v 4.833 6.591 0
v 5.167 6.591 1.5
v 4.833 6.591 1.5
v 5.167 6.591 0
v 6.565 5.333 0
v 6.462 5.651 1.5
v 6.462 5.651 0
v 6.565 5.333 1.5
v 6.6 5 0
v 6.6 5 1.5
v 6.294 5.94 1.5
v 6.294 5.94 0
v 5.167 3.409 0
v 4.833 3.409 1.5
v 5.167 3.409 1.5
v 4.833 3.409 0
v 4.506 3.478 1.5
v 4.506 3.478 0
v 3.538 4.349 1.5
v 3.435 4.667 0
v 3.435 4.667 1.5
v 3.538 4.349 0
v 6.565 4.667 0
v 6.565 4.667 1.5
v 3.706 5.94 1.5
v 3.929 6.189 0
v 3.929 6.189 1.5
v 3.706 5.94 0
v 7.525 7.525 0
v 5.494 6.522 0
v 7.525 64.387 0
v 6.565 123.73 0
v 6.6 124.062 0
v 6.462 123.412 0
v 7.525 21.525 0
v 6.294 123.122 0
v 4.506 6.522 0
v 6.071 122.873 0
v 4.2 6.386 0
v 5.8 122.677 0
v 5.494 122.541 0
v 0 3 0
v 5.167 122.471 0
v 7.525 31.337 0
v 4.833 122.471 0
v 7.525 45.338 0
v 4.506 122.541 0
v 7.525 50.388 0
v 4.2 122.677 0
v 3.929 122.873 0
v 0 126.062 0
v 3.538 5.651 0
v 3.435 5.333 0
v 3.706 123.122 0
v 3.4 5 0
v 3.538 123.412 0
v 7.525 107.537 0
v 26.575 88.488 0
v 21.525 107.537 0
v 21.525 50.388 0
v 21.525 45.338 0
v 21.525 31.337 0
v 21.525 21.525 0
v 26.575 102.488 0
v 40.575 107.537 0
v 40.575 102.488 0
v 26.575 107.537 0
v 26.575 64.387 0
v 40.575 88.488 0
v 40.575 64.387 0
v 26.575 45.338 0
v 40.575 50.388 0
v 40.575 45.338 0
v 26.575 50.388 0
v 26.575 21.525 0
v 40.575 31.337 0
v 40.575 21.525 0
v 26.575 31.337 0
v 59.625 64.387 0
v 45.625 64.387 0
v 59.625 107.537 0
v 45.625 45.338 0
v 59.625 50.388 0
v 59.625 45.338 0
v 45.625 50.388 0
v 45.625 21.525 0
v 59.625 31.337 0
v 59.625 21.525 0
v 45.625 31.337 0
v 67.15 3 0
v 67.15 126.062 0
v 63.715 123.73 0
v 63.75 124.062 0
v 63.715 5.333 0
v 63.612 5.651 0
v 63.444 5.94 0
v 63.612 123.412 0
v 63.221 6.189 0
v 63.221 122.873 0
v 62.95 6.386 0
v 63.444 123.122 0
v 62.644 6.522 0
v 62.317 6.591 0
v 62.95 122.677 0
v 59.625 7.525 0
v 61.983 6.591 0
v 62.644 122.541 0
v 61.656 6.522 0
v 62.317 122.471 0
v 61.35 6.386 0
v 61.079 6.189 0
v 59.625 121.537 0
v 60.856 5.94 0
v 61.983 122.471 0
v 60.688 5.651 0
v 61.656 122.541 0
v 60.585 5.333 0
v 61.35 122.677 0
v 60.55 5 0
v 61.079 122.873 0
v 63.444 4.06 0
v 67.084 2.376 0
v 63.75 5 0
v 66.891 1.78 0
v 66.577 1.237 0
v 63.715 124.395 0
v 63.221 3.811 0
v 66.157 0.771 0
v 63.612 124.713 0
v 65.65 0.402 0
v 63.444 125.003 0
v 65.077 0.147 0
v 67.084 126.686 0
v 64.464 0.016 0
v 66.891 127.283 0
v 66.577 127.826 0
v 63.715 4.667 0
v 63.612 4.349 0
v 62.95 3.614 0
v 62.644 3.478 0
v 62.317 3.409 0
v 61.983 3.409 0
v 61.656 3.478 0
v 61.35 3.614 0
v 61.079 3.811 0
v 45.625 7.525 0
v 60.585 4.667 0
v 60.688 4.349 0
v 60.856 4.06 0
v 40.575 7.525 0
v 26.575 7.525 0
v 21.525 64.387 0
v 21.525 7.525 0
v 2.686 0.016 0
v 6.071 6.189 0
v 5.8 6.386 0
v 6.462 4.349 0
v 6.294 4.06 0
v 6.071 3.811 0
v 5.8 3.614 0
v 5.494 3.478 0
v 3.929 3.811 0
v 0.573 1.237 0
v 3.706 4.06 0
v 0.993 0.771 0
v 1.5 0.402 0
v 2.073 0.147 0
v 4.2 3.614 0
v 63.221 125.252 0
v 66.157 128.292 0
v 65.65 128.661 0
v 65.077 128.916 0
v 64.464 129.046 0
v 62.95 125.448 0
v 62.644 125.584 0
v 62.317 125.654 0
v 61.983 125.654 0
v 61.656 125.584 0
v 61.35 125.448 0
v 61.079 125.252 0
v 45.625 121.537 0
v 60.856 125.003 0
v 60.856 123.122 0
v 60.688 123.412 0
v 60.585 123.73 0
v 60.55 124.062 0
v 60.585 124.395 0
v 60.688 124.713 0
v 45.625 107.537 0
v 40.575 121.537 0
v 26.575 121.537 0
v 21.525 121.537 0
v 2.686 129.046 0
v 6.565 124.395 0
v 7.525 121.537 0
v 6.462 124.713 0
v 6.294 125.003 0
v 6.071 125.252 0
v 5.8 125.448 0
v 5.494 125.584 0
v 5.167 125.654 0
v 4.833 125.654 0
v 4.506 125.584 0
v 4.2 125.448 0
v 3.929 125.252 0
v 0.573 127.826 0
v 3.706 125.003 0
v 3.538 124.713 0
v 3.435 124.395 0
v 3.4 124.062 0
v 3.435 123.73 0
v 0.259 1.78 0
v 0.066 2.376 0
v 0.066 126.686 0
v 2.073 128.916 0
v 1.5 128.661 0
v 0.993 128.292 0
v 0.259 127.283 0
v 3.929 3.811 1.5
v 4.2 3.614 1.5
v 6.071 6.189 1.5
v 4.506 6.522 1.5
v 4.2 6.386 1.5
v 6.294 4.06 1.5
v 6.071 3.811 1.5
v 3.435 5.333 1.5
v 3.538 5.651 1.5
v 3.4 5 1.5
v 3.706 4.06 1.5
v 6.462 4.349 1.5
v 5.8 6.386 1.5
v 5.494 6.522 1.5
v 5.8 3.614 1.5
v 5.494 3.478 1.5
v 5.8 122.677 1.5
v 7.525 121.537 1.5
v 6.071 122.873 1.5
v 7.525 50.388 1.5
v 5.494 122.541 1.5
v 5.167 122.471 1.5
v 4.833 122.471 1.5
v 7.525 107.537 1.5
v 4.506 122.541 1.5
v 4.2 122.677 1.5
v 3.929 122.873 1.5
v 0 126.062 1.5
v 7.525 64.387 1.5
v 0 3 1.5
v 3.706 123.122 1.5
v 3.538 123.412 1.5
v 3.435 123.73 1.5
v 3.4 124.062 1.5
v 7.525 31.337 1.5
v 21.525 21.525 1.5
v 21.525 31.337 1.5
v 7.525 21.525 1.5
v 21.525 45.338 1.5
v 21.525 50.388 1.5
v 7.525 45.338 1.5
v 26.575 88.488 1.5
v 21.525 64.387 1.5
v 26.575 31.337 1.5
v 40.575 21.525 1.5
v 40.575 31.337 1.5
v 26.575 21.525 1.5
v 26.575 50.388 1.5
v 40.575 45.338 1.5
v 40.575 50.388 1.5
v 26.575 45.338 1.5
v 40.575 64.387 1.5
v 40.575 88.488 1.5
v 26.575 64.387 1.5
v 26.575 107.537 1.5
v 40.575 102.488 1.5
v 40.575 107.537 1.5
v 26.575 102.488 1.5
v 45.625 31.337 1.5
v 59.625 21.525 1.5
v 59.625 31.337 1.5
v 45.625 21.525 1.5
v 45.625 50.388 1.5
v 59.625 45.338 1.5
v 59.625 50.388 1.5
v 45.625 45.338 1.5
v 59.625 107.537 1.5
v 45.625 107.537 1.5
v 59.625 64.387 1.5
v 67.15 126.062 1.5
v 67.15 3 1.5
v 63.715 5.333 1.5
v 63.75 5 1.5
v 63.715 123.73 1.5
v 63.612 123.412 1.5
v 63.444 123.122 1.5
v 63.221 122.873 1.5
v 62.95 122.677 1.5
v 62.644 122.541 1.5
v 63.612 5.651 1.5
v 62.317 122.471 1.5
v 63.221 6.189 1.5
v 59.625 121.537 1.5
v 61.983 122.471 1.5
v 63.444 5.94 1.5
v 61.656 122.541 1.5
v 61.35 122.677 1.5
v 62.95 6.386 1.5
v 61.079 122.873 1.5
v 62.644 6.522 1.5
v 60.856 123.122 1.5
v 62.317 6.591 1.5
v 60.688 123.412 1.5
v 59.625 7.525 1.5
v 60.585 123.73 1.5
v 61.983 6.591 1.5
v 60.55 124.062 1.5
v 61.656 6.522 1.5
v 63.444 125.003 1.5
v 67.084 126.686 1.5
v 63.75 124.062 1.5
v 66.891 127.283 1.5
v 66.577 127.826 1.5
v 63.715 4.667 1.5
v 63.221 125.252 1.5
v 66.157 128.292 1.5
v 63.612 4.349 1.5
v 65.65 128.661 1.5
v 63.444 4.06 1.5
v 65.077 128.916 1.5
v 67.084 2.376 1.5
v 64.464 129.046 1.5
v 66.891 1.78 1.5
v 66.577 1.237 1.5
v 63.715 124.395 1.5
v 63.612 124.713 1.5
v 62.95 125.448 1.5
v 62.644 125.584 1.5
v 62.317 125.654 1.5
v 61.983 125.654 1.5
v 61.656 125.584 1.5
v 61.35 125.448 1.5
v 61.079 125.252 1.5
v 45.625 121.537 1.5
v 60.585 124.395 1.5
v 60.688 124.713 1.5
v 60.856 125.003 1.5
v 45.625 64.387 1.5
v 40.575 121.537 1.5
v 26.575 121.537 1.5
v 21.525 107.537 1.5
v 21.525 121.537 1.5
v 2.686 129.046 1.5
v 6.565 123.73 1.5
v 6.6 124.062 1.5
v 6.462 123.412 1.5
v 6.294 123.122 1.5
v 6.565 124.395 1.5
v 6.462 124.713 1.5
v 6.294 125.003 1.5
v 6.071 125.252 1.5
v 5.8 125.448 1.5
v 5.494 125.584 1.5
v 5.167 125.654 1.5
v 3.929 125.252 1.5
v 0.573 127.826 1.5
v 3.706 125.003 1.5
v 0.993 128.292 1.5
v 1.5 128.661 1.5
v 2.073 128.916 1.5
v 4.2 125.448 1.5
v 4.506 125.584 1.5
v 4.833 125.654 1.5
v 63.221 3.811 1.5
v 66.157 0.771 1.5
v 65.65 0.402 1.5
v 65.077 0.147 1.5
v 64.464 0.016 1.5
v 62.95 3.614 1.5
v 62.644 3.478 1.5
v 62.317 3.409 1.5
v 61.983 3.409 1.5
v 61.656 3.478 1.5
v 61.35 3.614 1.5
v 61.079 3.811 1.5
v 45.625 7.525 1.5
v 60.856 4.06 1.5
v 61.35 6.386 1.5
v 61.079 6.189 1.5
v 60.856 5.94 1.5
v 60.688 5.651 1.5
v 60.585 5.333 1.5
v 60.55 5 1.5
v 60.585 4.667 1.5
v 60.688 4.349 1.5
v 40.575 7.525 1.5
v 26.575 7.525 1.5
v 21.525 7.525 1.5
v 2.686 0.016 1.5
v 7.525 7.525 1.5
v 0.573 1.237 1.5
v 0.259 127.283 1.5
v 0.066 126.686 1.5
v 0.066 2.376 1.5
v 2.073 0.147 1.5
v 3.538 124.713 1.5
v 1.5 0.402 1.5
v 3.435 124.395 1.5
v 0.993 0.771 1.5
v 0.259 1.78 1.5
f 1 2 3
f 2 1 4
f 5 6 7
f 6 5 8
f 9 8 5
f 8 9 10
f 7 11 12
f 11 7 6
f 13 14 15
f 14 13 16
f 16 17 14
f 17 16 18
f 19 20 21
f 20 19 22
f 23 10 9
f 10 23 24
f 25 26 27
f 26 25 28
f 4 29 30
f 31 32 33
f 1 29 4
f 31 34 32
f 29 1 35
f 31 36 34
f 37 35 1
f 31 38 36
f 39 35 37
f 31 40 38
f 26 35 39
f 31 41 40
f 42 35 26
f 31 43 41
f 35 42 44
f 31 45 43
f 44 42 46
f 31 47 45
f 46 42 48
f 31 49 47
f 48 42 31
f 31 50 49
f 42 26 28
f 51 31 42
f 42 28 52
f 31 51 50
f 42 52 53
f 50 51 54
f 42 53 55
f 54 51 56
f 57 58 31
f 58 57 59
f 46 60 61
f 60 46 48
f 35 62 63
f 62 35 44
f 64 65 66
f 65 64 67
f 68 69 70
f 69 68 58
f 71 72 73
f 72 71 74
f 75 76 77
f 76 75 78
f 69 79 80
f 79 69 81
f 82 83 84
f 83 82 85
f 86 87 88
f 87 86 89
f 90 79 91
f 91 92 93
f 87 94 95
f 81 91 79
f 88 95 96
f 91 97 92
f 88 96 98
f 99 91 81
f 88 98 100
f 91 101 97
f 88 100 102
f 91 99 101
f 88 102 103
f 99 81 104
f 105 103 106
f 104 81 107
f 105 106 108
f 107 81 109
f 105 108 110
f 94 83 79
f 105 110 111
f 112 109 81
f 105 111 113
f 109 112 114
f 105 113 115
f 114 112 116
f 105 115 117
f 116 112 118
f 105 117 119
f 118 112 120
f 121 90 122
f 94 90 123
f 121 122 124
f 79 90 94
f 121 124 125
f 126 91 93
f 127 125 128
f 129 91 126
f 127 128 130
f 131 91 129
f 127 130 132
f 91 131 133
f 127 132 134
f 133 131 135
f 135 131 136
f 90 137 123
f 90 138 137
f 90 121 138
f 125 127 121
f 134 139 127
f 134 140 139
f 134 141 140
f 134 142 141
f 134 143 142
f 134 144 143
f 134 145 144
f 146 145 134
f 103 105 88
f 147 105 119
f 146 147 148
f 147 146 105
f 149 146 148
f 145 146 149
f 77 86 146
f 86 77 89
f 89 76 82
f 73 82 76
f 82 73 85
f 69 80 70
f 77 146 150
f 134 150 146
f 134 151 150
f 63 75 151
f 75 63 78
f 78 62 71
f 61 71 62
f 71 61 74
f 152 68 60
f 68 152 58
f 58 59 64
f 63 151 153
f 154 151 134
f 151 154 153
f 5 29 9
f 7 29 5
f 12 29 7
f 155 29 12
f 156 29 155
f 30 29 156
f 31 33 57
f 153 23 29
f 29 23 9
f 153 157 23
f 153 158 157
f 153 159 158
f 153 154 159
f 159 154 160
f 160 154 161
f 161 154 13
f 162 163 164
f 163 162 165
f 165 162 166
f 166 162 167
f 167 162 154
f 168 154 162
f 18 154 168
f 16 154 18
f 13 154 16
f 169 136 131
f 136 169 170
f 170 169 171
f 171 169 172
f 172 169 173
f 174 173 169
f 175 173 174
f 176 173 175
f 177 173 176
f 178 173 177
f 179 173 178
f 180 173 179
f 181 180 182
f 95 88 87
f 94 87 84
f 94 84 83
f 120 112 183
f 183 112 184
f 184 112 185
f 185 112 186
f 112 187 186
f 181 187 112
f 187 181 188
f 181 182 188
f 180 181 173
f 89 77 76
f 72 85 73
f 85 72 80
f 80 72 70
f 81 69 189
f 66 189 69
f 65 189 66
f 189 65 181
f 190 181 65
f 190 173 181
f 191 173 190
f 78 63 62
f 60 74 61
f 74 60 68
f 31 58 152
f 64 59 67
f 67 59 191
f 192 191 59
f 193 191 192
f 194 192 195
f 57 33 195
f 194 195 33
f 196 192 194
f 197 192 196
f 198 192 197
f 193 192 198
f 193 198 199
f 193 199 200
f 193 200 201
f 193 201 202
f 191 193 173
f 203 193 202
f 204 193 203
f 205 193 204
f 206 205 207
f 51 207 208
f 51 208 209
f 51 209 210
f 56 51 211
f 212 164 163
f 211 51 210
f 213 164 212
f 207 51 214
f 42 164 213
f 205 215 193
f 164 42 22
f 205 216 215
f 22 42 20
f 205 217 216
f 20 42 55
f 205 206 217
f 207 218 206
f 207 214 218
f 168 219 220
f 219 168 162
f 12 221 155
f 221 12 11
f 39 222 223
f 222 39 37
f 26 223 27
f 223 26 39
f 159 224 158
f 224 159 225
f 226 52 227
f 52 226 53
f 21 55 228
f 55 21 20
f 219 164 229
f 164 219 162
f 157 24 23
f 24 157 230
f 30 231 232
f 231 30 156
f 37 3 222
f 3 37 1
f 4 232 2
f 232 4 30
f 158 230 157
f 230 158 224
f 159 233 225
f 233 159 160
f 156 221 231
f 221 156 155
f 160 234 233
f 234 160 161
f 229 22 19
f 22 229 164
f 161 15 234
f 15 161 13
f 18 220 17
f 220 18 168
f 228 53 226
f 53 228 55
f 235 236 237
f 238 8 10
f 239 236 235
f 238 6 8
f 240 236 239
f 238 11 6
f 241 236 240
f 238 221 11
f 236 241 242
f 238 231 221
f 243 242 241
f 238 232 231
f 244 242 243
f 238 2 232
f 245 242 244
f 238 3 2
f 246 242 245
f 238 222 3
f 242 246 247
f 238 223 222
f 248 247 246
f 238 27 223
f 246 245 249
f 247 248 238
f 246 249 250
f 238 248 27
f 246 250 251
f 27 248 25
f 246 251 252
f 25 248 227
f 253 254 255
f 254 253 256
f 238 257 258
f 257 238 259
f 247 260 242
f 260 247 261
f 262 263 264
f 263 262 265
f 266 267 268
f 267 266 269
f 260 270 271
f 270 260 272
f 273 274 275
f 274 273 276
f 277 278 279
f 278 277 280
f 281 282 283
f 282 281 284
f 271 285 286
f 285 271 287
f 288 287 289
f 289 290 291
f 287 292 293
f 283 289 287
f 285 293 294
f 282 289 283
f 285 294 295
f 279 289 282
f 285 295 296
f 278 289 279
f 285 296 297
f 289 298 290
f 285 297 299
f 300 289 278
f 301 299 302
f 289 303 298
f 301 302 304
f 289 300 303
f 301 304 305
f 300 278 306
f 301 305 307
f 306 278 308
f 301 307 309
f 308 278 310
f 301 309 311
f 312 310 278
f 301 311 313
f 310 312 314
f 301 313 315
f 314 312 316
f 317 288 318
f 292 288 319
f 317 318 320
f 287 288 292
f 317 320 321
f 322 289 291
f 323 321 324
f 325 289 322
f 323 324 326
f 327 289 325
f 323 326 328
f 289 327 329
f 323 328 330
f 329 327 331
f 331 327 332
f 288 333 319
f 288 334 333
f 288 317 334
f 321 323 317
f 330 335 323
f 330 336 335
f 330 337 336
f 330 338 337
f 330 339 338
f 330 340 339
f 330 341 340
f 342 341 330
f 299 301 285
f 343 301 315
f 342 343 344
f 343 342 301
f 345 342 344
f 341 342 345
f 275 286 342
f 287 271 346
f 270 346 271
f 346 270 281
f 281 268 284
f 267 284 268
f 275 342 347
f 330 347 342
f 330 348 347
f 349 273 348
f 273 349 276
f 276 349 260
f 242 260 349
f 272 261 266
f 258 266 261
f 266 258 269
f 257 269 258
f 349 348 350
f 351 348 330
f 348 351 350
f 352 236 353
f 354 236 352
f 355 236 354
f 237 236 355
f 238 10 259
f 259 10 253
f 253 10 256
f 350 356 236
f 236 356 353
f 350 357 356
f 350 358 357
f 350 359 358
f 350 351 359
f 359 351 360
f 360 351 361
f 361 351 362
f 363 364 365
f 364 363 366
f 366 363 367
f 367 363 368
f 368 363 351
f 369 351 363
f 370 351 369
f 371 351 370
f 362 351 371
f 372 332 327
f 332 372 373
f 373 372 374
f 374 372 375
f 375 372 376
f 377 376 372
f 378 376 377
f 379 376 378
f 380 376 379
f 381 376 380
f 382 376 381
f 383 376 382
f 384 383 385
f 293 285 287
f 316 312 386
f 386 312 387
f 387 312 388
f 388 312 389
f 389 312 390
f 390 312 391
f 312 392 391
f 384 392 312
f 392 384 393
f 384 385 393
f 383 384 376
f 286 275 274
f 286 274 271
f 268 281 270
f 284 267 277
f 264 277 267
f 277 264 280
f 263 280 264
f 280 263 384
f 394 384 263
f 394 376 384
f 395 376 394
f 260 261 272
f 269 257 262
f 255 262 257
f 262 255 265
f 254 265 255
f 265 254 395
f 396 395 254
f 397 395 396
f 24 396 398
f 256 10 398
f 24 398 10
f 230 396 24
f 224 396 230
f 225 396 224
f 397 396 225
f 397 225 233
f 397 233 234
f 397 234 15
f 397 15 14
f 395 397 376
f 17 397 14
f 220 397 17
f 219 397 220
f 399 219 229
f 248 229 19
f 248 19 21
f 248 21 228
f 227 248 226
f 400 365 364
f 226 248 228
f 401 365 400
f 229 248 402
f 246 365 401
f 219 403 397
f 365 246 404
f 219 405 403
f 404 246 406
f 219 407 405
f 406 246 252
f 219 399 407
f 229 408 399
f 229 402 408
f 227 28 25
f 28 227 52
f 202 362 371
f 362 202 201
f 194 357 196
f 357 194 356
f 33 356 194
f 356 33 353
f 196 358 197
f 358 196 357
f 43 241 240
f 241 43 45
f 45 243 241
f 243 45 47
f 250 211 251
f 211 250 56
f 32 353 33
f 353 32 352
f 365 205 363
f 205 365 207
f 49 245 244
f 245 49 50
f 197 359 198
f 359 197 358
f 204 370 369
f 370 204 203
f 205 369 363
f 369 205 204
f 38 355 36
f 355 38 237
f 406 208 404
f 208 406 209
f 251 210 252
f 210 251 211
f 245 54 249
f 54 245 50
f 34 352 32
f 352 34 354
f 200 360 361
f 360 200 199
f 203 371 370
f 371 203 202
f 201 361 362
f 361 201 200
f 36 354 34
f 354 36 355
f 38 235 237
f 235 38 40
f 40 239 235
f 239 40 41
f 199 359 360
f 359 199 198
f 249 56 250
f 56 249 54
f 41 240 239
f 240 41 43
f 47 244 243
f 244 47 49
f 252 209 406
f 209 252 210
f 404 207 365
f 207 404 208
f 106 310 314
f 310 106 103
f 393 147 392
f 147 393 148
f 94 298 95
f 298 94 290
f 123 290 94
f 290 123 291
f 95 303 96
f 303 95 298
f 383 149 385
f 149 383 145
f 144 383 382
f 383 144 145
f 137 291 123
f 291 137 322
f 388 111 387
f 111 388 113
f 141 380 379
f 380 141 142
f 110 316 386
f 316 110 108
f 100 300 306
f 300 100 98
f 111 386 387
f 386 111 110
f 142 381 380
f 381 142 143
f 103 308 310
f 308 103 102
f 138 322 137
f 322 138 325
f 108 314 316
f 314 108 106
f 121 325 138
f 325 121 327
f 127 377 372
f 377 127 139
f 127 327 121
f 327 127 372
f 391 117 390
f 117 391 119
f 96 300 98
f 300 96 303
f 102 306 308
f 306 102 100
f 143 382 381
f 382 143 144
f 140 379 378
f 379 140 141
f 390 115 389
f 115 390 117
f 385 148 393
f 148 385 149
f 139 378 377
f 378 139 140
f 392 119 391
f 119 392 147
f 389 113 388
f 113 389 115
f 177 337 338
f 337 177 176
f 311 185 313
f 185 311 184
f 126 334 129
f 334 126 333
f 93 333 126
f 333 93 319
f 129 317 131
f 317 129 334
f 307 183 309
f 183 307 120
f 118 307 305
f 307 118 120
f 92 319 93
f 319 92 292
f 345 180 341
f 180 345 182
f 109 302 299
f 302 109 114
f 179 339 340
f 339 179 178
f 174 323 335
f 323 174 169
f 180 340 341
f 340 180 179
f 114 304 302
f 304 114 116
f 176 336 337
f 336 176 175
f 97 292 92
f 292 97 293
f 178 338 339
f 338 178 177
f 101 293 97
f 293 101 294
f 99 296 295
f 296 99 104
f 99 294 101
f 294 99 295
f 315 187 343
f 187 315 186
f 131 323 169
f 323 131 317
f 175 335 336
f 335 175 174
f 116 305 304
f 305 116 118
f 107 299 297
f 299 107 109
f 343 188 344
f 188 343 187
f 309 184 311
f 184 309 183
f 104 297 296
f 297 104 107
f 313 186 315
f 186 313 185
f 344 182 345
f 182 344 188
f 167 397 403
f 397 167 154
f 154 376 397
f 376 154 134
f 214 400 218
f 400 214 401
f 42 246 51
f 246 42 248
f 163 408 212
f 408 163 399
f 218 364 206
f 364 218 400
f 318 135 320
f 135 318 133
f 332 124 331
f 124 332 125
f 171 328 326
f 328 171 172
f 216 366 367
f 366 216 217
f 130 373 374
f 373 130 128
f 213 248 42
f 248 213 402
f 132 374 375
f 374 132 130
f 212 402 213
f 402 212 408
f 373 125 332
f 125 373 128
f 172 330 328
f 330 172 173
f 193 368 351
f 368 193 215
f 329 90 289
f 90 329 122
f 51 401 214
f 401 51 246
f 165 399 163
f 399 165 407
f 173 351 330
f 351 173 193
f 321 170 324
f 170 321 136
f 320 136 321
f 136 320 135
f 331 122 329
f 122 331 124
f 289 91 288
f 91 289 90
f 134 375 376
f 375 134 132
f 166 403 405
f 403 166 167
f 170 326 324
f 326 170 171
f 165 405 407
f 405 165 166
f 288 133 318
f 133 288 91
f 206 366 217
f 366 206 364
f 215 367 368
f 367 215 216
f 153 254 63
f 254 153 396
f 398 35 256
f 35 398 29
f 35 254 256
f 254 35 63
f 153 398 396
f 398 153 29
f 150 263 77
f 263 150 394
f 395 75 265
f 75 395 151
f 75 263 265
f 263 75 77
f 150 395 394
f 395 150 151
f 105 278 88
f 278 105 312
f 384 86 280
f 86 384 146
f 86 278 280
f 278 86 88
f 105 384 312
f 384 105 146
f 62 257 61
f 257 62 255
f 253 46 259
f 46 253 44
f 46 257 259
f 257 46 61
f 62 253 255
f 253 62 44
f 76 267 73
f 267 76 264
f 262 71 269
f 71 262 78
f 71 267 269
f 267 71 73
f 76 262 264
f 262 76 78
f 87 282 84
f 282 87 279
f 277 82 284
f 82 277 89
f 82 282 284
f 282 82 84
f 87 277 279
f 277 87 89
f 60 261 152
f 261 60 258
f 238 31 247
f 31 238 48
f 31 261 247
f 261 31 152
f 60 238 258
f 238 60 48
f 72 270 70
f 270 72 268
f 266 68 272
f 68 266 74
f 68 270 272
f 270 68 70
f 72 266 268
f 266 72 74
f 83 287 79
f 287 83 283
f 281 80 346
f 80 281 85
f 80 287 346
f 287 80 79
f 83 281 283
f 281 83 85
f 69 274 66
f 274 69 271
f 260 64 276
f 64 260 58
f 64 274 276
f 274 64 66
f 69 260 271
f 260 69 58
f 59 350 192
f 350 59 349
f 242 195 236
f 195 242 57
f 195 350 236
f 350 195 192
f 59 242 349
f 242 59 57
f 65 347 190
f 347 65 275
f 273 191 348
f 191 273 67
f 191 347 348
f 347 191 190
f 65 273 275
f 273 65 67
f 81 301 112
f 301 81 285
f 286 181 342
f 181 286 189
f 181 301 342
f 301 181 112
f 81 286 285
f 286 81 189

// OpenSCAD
/**
 * This file is generated by layout file.
 * Do not edit this file directly.
 */

plate_depth = 1.5;
offset = (19.05 - 14) / 2;
stabilizer_width = 8.4;
stabilizer_height = 14;


$fn = 30;

module rounded_cube(dimens, radius) {
    hull() {
        translate([radius, radius]) cylinder(r=radius, h=dimens[2]);
        translate([dimens[0]-radius, radius]) cylinder(r=radius, h=dimens[2]);
        translate([dimens[0]-radius, dimens[1]-radius]) cylinder(r=radius, h=dimens[2]);
        translate([radius, dimens[1]-radius]) cylinder(r=radius, h=dimens[2]);
    }
}

module half_bevel_cube(dimens, cut_len) {
    hull() {
        x_dimens = [dimens[0]-2*cut_len, dimens[1], dimens[2]];
        translate([cut_len, 0, 0]) cube(x_dimens);

        y_dimens = [dimens[0], dimens[1]-2*cut_len, dimens[2]];
        translate([0, cut_len, 0]) cube(y_dimens);
    }
}

module screw_holes(dimens) {
    padding = 5;
    screw_diameter = 3.2;

    union() {
        translate([padding, padding, 0]) cylinder(d=screw_diameter, h=dimens[2]);
        translate([padding, dimens[1]-padding, 0]) cylinder(d=screw_diameter, h=dimens[2]);
        translate([dimens[0]-padding, padding, 0]) cylinder(d=screw_diameter, h=dimens[2]);
        translate([dimens[0]-padding, dimens[1]-padding, 0]) cylinder(d=screw_diameter, h=dimens[2]);
    }
}


module switch_hole() {
    translate([offset, offset, 0]) union() {
        cube([14, 14, plate_depth]);

        // translate([4.5, -1, 1.5]) cube([5, 1, plate_depth-1.5]);
        // translate([4.5, 14, 1.5]) cube([5, 1, plate_depth-1.5]);
    }
}

module stabilizer_hole() {
    translate([offset, offset, 0]) union() {
        translate([-stabilizer_width+0.1, 1, 0]) cube([stabilizer_width, stabilizer_height, plate_depth]);
        translate([14-0.1, 1, 0]) cube([stabilizer_width, stabilizer_height, plate_depth]);
    }
}


difference() {
    dimens = [67.15, 129.0625, plate_depth];
    rounded_cube(dimens, 3);
    screw_holes(dimens);
    translate([5.0, 5.0, 0]) switch_hole();
    translate([24.05, 5.0, 0]) switch_hole();
    translate([43.1, 5.0, 0]) switch_hole();
    translate([5.0, 28.8125, 0]) switch_hole();
    translate([24.05, 28.8125, 0]) switch_hole();
    translate([43.1, 28.8125, 0]) switch_hole();
    translate([5.0, 47.862500000000004, 0]) switch_hole();
    translate([24.05, 47.862500000000004, 0]) switch_hole();
    translate([43.1, 47.862500000000004, 0]) switch_hole();
    translate([24.05, 85.9625, 0]) switch_hole();
    translate([5.0, 105.0125, 0]) switch_hole();
    translate([24.05, 105.0125, 0]) switch_hole();
    translate([43.1, 105.0125, 0]) switch_hole();
}
